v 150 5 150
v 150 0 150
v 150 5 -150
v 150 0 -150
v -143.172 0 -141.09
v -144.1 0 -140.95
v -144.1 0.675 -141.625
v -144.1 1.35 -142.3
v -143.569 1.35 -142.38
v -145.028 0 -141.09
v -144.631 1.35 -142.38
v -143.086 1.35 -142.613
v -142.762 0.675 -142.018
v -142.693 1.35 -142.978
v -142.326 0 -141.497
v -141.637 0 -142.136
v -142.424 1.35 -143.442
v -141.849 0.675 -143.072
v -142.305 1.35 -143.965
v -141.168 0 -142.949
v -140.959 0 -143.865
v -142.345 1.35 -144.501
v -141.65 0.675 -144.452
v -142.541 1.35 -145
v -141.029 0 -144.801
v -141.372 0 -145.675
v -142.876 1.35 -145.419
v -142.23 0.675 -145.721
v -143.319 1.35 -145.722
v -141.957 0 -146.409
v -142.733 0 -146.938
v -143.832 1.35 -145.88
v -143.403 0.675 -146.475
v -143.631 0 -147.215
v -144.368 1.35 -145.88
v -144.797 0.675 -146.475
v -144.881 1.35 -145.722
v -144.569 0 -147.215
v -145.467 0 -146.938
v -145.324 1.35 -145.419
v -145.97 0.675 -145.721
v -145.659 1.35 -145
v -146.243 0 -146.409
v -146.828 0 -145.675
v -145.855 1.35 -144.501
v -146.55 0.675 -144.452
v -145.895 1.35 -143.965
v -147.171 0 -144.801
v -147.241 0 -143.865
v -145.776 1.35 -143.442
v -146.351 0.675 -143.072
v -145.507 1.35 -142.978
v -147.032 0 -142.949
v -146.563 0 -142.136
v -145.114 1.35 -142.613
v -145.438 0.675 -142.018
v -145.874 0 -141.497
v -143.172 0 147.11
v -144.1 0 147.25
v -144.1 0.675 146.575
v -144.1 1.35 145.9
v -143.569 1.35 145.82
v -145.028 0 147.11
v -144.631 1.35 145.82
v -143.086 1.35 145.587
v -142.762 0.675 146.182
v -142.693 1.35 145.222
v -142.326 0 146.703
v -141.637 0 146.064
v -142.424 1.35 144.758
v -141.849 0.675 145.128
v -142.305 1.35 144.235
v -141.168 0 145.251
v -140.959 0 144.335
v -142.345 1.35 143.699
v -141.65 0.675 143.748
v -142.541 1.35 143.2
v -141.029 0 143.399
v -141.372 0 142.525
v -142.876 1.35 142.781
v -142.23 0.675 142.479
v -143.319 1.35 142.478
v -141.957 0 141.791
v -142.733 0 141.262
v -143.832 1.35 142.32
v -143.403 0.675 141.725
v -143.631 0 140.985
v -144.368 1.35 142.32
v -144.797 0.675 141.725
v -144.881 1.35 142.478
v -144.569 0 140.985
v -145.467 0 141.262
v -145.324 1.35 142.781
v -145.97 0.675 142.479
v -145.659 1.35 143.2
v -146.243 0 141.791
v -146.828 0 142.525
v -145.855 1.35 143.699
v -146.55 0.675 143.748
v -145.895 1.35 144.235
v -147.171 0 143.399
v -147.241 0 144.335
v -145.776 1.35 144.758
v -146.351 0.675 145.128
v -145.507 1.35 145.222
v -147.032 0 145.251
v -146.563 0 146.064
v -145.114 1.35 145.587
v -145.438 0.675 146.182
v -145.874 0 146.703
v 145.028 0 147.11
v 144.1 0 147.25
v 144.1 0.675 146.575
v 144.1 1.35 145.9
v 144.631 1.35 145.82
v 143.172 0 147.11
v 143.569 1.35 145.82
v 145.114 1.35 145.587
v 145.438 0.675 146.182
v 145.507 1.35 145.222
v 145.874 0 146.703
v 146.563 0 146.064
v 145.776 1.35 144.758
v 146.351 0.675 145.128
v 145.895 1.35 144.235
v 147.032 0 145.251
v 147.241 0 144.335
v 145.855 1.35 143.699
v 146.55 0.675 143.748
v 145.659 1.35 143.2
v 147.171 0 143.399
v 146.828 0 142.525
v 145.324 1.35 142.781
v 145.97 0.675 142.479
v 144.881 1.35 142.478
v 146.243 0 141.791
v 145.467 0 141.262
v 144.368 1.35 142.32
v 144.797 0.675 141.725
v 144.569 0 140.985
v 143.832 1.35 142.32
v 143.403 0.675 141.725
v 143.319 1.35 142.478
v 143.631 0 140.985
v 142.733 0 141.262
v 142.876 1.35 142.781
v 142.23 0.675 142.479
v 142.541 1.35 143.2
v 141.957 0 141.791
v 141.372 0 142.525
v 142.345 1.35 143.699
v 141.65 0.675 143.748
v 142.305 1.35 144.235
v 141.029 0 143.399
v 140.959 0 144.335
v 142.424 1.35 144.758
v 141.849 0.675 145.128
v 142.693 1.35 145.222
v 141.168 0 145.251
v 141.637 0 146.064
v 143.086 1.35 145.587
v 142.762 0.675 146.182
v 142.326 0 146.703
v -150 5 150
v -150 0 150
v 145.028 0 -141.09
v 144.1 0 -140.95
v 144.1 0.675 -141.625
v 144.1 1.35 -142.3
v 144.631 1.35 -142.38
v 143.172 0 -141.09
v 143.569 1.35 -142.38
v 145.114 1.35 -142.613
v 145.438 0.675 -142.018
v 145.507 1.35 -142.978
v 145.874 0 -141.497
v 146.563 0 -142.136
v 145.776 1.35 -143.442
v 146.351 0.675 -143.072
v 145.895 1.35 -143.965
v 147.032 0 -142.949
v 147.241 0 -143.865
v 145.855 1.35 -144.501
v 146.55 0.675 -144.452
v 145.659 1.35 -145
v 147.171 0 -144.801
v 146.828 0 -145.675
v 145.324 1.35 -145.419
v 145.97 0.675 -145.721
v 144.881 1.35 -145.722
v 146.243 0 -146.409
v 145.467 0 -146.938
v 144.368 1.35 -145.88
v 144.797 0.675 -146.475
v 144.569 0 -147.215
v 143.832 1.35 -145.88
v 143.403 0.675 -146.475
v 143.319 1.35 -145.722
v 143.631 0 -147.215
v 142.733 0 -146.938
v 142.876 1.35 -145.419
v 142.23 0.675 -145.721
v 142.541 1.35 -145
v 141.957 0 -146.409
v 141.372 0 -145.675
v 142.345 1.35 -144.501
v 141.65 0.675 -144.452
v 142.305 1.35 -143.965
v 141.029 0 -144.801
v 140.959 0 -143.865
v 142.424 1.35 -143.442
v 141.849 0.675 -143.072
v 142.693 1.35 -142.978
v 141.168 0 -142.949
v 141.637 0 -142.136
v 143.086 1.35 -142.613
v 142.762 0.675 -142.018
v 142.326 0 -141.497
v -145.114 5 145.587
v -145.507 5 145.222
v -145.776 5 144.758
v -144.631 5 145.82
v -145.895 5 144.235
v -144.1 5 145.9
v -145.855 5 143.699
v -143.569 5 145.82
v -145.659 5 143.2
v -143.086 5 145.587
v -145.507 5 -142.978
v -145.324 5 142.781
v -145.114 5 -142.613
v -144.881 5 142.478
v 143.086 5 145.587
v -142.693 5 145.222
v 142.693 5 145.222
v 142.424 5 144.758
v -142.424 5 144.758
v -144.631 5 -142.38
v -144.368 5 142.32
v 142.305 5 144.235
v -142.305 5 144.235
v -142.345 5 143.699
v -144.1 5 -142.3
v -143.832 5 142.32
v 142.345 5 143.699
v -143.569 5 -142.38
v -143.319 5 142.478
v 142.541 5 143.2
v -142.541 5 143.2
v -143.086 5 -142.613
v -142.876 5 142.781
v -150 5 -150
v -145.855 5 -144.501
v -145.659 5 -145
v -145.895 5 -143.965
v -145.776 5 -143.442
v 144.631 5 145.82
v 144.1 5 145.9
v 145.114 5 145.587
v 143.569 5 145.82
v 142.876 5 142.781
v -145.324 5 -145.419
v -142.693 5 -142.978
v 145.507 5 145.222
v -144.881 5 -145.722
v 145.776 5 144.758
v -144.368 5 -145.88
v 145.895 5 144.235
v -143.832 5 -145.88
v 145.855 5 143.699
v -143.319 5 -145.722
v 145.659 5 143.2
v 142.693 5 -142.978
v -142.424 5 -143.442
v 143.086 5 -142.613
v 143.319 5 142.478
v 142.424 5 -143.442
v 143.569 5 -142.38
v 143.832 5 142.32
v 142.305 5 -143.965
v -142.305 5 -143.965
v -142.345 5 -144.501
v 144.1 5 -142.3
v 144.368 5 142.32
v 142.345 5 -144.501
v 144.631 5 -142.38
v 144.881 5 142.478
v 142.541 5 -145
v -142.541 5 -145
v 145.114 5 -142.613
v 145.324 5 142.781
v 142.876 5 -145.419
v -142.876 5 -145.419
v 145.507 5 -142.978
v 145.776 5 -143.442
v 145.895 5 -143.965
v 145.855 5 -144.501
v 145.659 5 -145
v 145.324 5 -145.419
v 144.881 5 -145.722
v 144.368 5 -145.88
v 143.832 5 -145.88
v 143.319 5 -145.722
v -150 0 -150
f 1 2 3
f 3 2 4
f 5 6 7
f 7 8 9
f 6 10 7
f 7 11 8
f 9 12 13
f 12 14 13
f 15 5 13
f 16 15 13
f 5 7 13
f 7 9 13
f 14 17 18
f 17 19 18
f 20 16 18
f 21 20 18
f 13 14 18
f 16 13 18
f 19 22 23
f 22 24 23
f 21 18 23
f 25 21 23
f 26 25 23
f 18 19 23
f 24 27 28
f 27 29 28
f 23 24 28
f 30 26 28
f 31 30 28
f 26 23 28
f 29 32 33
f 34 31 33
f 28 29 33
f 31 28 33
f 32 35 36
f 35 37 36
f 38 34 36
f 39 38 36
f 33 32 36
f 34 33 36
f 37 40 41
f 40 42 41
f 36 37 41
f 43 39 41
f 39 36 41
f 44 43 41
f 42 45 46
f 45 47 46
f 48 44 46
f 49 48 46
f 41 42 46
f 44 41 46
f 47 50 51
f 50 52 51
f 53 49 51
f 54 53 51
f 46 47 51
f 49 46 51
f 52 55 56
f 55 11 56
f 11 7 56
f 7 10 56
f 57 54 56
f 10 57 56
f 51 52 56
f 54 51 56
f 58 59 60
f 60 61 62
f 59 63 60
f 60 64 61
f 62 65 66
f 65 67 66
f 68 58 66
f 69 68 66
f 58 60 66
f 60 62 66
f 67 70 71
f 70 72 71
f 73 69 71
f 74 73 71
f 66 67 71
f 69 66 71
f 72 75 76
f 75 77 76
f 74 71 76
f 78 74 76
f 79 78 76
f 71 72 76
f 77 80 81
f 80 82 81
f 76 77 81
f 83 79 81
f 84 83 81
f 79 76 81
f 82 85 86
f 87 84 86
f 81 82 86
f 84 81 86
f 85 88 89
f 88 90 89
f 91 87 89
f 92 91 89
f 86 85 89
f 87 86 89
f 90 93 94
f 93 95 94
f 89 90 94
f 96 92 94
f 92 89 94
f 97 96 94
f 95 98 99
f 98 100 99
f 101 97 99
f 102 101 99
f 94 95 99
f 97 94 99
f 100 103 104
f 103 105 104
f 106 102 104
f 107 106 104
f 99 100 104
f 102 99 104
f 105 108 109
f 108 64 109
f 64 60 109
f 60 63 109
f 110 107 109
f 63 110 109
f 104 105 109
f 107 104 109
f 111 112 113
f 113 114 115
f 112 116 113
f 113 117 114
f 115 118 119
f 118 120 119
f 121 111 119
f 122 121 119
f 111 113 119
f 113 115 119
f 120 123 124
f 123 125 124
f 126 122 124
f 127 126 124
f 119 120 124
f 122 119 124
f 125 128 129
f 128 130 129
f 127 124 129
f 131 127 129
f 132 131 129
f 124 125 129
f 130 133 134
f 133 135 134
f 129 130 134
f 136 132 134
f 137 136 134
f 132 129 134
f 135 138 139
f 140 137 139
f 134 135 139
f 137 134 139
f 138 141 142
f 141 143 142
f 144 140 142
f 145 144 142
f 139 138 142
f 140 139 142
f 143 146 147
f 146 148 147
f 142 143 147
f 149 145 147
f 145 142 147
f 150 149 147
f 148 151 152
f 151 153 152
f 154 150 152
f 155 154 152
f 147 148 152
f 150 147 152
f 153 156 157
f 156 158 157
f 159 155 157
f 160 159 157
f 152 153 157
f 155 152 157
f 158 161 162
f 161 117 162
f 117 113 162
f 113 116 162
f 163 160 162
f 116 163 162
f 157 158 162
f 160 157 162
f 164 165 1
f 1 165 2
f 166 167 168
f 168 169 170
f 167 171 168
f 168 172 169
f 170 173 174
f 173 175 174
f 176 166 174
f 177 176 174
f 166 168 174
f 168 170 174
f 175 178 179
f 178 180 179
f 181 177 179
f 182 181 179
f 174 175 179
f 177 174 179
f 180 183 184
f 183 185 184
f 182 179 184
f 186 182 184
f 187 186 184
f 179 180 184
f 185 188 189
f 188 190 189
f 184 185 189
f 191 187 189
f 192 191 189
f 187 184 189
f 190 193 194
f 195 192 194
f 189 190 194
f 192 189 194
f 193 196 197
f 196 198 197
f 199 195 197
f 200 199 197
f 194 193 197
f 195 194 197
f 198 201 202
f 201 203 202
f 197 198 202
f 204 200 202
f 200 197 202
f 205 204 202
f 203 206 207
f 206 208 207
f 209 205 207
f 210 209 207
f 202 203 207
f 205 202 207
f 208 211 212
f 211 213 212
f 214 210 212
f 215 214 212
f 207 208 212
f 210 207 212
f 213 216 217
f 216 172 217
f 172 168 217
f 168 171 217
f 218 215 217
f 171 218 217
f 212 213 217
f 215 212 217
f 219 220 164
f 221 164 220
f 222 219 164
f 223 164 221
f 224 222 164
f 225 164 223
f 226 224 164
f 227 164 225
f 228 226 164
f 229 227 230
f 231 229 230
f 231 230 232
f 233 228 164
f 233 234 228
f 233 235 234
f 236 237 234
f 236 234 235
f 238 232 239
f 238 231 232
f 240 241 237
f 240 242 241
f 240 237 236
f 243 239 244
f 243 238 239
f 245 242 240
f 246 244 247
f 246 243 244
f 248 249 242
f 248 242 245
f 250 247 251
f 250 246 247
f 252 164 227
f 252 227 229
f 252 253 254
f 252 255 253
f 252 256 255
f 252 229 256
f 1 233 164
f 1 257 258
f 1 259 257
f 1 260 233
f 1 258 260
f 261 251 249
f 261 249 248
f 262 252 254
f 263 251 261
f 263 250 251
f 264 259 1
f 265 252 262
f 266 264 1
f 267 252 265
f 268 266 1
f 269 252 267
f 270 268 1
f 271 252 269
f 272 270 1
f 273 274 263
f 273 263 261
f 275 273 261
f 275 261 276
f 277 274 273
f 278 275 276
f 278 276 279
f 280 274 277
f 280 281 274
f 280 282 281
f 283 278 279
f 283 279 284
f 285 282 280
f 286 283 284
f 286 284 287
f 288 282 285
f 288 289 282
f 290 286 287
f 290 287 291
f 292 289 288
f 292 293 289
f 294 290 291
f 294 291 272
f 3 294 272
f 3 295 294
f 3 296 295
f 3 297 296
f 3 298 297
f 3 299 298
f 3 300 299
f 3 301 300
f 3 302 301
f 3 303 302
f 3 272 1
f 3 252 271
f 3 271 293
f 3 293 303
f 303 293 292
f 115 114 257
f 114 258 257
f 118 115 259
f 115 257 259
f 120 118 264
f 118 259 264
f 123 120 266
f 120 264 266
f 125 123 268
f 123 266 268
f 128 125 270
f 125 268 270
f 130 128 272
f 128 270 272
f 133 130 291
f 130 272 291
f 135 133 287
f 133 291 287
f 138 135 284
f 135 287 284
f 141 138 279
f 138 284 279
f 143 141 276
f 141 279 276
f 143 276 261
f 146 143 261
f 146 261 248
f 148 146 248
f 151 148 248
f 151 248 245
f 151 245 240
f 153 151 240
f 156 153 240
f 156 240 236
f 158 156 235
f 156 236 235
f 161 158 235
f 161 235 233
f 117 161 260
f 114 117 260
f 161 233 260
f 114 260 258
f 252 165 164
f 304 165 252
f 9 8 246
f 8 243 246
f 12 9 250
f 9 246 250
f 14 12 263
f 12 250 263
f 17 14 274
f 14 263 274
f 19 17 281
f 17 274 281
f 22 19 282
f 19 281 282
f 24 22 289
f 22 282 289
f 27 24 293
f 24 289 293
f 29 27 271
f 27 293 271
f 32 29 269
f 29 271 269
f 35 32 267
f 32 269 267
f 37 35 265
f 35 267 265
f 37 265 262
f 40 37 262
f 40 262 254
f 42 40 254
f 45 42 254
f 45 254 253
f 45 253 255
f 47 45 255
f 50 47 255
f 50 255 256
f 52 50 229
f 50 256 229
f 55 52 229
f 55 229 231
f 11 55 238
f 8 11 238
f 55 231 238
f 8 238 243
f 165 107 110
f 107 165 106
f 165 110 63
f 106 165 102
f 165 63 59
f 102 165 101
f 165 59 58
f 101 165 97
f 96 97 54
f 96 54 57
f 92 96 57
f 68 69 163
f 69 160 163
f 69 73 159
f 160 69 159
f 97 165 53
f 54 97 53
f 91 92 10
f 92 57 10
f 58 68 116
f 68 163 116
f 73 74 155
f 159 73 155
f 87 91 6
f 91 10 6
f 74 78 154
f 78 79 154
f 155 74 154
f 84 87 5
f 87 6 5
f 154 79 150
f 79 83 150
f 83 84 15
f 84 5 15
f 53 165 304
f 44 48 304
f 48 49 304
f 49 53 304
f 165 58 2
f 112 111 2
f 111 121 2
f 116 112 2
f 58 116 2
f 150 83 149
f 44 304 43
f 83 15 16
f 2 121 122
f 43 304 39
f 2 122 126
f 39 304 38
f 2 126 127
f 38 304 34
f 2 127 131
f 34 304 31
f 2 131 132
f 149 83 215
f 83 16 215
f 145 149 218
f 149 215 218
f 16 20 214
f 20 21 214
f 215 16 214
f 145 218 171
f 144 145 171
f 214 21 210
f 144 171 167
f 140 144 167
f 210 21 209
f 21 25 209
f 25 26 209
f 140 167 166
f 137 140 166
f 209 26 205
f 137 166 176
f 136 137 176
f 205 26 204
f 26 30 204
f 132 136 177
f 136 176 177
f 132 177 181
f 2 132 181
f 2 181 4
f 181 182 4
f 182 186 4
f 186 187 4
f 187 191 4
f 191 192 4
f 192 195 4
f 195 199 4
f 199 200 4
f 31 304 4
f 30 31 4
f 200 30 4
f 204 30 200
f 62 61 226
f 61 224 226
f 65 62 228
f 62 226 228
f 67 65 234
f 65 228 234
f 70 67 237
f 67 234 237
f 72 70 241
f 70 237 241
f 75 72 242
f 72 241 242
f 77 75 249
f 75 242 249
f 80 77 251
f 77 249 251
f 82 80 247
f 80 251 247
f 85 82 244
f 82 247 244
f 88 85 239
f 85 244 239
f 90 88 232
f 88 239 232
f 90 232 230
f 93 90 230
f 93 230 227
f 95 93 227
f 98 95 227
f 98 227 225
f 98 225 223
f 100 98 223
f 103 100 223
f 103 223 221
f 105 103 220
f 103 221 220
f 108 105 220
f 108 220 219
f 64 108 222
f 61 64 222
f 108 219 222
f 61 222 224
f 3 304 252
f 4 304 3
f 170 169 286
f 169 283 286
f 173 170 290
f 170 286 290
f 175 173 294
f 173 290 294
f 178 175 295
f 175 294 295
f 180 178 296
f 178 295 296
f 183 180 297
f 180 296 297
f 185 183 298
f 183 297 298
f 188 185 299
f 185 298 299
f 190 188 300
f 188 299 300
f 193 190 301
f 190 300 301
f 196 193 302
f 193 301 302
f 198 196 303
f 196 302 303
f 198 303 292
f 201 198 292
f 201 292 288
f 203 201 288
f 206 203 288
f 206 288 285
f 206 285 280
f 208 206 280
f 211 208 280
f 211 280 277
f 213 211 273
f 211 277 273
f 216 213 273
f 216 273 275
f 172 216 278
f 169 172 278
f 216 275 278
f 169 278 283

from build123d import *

# Parameters (mm, degrees)
SKETCH1_W                                           = 300
SKETCH1_H                                           = 300
BOSS_EXTRUDE1_DEPTH                                 = 5
CSK_FOR_M3_COUNTERSUNK_FLAT_HEAD_SCREW1_D           = 3.6
CSK_FOR_M3_COUNTERSUNK_FLAT_HEAD_SCREW1_CSINK_D     = 6.3
CSK_FOR_M3_COUNTERSUNK_FLAT_HEAD_SCREW1_CSINK_ANGLE = 90


with BuildPart() as part:
    # Sketch1 → Boss-Extrude1 (new body)
    with BuildSketch(Plane(origin=(0, 0, 0), x_dir=(1, 0, 0), z_dir=(0, 1, 0))):
        Rectangle(SKETCH1_W, SKETCH1_H)
    extrude(amount=BOSS_EXTRUDE1_DEPTH)

    # CSK for M3 Countersunk Flat Head Screw1 (through all)
    with Locations(Plane(origin=(144.1, 0, 144.1), x_dir=(0, 0, -1), z_dir=(0, -1, 0))):
        with Locations((0, 0), (0, -288.2), (288.2, -288.2), (288.2, 0)):
            CounterSinkHole(CSK_FOR_M3_COUNTERSUNK_FLAT_HEAD_SCREW1_D / 2, CSK_FOR_M3_COUNTERSUNK_FLAT_HEAD_SCREW1_CSINK_D / 2, counter_sink_angle=CSK_FOR_M3_COUNTERSUNK_FLAT_HEAD_SCREW1_CSINK_ANGLE)


solid = part.part
